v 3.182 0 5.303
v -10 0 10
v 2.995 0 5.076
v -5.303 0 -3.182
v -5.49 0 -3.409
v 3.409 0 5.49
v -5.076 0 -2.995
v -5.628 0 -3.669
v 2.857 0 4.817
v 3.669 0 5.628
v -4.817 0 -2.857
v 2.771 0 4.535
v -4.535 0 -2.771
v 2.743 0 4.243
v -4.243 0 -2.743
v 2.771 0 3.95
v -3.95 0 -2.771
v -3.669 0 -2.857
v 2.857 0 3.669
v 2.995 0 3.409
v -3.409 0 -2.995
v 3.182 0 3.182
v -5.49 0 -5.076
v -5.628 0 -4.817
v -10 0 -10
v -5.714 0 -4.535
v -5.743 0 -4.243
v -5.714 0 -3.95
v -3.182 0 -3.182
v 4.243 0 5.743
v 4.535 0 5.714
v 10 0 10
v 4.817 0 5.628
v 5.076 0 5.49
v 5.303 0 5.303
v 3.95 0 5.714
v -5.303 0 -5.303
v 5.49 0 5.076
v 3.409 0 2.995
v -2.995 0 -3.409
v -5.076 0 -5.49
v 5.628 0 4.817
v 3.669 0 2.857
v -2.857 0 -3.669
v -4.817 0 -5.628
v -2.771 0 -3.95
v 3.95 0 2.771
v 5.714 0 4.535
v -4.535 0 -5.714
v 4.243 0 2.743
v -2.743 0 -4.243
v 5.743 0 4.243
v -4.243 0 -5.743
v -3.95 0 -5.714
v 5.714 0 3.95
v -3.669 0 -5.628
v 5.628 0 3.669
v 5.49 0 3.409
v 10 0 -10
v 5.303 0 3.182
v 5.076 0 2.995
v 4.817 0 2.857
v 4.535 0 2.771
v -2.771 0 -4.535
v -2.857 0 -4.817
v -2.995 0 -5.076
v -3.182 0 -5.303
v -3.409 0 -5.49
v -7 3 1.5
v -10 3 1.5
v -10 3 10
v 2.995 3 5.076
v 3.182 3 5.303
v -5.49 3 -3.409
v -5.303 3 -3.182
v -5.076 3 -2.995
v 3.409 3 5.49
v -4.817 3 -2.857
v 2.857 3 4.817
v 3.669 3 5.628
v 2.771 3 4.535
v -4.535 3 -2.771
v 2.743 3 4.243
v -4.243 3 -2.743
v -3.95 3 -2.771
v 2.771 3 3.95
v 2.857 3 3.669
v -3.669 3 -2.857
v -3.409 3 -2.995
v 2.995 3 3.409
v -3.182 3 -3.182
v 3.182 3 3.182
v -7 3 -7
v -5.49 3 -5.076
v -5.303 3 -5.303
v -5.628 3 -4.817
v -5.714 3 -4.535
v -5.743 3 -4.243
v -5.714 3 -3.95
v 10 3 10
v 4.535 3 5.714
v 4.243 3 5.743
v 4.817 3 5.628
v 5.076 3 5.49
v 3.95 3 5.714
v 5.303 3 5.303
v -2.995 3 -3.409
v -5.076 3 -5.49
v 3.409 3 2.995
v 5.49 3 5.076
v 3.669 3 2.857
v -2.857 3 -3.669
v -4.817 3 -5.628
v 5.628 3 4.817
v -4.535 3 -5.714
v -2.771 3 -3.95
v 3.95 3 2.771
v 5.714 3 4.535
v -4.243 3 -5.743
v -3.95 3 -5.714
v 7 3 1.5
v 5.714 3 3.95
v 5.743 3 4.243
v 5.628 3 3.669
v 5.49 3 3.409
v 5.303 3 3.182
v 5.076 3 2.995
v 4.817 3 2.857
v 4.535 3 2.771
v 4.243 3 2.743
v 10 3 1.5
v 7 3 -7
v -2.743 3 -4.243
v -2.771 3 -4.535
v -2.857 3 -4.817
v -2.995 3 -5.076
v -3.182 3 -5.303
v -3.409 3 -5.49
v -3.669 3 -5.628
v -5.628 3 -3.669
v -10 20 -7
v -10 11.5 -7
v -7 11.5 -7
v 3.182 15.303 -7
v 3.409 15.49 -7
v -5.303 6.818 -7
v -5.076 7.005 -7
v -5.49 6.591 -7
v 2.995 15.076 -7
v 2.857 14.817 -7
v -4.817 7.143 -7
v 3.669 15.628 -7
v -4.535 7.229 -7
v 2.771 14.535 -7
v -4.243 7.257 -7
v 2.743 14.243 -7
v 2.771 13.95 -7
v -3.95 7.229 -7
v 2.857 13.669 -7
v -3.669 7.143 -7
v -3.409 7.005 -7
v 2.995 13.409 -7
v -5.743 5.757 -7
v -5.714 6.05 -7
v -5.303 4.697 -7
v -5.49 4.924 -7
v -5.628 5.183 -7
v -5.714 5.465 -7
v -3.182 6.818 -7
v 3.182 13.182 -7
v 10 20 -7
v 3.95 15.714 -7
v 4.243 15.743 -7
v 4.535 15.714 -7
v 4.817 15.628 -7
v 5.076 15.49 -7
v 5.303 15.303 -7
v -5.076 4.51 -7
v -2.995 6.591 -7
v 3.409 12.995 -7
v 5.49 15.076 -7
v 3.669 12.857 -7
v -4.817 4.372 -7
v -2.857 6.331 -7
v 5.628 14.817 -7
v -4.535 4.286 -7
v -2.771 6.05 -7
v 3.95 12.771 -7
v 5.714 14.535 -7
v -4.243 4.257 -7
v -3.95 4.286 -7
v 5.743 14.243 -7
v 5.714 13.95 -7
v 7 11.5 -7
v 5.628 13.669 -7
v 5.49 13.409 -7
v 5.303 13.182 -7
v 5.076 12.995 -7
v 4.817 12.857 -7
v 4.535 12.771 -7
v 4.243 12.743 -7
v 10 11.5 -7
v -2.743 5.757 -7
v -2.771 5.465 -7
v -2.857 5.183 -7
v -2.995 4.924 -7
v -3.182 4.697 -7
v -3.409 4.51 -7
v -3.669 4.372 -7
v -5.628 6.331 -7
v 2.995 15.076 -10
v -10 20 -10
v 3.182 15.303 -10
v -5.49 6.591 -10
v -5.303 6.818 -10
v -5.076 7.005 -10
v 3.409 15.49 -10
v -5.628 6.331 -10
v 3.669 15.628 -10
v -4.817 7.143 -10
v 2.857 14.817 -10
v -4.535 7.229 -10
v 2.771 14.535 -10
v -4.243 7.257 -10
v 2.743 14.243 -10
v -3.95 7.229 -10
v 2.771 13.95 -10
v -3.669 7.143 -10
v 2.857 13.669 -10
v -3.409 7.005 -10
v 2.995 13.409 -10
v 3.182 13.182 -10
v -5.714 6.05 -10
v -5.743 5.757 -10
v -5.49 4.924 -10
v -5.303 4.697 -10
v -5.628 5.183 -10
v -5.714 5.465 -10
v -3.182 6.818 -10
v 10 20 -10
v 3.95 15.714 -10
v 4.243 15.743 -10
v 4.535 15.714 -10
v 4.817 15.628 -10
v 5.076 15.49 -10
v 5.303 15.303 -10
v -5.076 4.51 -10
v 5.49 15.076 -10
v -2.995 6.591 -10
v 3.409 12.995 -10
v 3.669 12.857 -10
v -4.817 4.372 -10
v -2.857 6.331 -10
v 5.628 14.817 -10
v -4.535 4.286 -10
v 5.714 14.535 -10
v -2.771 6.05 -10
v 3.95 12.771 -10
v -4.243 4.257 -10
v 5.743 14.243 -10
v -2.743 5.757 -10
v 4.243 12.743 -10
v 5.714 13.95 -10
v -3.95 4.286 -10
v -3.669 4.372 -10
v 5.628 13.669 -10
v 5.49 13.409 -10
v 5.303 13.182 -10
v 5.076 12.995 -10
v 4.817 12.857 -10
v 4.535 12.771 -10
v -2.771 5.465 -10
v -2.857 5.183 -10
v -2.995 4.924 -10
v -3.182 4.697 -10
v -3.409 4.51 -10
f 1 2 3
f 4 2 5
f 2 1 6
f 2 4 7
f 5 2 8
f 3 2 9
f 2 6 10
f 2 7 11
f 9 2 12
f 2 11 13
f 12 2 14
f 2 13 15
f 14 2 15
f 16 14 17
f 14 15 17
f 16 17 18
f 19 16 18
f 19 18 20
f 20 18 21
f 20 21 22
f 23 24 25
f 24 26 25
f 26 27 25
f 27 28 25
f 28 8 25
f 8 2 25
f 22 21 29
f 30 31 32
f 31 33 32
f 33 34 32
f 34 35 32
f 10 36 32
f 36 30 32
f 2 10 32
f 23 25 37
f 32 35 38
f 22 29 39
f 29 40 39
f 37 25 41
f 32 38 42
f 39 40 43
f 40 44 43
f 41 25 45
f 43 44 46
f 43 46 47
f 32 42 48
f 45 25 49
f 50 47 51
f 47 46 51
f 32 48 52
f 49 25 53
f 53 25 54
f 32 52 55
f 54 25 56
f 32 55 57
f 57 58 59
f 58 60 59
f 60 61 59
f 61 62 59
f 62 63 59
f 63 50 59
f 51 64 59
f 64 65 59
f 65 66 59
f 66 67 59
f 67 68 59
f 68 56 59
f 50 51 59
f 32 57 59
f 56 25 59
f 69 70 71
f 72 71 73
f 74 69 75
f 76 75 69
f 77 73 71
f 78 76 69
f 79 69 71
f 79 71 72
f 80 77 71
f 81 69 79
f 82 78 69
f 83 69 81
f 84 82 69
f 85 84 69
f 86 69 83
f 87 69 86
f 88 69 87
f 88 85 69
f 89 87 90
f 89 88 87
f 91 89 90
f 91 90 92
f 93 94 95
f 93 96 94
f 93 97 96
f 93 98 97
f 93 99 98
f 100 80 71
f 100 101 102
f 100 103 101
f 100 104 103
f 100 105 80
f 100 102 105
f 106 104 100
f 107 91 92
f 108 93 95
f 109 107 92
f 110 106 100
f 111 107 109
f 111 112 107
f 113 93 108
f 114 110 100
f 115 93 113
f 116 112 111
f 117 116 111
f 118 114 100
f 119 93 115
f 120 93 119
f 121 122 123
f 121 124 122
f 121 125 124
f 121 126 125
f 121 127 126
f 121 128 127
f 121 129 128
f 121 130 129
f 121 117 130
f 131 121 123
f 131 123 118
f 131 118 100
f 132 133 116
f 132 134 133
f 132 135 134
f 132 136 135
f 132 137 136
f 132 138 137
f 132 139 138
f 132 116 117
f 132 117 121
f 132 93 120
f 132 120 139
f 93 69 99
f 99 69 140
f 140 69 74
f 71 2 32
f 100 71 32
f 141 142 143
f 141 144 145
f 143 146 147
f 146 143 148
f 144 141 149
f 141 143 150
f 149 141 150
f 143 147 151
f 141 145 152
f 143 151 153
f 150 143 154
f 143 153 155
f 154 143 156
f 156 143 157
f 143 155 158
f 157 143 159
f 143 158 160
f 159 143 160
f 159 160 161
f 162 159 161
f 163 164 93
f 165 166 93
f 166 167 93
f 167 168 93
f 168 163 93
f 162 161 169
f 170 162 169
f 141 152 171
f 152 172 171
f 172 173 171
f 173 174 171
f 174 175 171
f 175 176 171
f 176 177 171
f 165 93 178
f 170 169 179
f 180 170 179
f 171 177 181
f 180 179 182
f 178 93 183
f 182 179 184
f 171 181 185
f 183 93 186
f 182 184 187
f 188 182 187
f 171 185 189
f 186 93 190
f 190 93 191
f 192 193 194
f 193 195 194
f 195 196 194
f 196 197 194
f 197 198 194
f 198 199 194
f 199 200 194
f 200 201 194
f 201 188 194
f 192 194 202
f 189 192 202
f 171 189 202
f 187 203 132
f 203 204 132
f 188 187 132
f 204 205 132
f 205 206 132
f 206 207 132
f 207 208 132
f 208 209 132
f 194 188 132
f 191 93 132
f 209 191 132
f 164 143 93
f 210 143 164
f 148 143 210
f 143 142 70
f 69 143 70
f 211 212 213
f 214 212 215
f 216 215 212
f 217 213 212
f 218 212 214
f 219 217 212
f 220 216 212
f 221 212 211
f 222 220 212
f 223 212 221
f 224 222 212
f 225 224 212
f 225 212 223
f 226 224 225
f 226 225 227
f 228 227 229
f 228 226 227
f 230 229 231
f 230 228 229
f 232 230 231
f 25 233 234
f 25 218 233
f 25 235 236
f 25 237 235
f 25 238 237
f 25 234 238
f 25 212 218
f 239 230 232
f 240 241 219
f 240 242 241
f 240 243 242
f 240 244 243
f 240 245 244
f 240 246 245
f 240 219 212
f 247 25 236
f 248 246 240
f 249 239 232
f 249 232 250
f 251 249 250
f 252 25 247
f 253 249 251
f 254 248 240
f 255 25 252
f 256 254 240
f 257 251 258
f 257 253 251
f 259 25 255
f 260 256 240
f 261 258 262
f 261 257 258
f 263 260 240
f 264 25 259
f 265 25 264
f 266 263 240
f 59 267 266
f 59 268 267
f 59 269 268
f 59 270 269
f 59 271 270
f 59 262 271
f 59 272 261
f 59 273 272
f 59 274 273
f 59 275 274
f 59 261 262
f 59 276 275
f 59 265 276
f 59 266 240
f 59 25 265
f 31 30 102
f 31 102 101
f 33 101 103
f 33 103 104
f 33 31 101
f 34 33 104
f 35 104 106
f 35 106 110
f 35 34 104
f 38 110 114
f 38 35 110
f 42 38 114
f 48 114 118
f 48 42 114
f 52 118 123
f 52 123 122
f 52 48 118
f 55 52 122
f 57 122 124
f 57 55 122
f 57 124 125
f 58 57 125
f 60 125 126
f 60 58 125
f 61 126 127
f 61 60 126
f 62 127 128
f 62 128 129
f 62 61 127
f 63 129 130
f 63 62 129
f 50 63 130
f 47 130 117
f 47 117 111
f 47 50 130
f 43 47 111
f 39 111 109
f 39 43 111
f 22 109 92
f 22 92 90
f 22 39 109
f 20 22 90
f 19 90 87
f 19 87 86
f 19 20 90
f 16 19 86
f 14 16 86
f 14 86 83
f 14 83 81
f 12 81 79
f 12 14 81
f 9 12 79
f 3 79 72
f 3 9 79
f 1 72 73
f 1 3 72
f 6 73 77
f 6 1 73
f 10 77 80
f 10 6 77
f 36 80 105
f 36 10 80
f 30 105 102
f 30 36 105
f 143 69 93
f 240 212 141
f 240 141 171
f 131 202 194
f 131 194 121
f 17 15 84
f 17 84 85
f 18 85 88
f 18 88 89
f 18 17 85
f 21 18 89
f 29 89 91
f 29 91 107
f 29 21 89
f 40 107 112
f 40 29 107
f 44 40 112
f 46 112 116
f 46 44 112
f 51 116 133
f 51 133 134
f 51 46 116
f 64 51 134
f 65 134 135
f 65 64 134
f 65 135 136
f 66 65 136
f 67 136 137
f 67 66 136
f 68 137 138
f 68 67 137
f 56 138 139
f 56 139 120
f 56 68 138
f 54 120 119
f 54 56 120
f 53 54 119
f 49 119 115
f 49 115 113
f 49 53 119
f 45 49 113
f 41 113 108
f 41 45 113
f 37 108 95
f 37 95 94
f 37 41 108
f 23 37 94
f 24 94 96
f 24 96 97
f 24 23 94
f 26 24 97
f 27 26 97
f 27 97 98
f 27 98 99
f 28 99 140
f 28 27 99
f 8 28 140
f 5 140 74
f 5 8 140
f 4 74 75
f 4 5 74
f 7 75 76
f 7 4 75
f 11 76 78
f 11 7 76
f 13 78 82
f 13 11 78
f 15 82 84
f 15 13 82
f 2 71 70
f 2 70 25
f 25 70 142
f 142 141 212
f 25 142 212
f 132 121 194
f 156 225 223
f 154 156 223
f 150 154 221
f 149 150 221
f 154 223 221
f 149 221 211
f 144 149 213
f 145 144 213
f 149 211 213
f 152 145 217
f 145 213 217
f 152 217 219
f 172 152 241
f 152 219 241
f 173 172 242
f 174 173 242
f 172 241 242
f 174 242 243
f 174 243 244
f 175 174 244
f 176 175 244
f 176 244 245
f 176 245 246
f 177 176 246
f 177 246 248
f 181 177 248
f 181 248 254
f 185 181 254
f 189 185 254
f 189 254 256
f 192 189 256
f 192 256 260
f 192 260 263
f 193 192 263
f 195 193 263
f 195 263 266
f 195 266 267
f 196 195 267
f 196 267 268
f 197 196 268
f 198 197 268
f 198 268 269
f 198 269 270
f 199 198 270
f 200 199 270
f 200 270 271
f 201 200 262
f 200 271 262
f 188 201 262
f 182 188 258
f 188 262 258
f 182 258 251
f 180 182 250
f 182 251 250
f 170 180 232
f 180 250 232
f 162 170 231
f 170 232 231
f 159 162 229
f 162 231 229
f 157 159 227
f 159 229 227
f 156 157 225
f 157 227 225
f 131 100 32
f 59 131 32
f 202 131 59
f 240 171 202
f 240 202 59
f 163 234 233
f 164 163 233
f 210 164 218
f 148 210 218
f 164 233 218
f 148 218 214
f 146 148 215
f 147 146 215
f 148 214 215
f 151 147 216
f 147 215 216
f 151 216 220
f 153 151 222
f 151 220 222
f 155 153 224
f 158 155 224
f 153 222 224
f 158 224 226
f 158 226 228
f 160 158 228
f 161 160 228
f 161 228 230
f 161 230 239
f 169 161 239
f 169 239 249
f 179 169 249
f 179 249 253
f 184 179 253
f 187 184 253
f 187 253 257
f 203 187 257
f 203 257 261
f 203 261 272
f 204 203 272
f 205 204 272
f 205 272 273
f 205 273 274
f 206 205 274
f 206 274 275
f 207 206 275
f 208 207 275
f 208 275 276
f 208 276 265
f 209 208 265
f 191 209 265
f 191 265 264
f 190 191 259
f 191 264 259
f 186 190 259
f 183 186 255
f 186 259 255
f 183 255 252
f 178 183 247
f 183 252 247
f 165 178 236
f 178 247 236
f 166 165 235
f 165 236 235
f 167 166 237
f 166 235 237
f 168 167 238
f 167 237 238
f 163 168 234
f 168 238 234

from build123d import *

# Parameters (mm, degrees)
SKETCH1_W           = 20
SKETCH1_H           = 20
SKETCH1_R           = 1.5
BOSS_EXTRUDE1_DEPTH = 3
SKETCH2_W           = 20
SKETCH2_H           = 3
BOSS_EXTRUDE2_DEPTH = 17
SKETCH3_R           = 1.5
CUT_EXTRUDE1_DEPTH  = 30
BOSS_EXTRUDE3_DEPTH = 3
BOSS_EXTRUDE4_START = -20
BOSS_EXTRUDE4_DEPTH = 3


with BuildPart() as part:
    # Sketch1 → Boss-Extrude1 (new body)
    with BuildSketch(Plane(origin=(0, 0, 0), x_dir=(1, 0, 0), z_dir=(0, 1, 0))):
        Rectangle(SKETCH1_W, SKETCH1_H)
        with Locations(Location((-4.242640687, 4.242640687, 0), (0, 0, 270))):
            Circle(SKETCH1_R, mode=Mode.SUBTRACT)
        with Locations(Location((4.242640687, -4.242640687, 0), (0, 0, 270))):
            Circle(SKETCH1_R, mode=Mode.SUBTRACT)
    extrude(amount=BOSS_EXTRUDE1_DEPTH)

    # Sketch2 → Boss-Extrude2 (add)
    with BuildSketch(Plane(origin=(0, 3, 0), x_dir=(1, 0, 0), z_dir=(0, 1, 0))):
        with Locations((0, 8.5)):
            Rectangle(SKETCH2_W, SKETCH2_H)
    extrude(amount=BOSS_EXTRUDE2_DEPTH)

    # Sketch3 → Cut-Extrude1 (cut)
    with BuildSketch(Plane(origin=(0, 0, -10), x_dir=(-1, 0, 0), z_dir=(0, 0, -1))):
        with Locations((-4.242640687, 14.242640687)):
            Circle(SKETCH3_R)
        with Locations((4.242640687, 5.757359313)):
            Circle(SKETCH3_R)
    extrude(amount=-CUT_EXTRUDE1_DEPTH, mode=Mode.SUBTRACT)

    # Sketch4 → Boss-Extrude3 (add)
    with BuildSketch(Plane.ZY.offset(10)):
        Polygon((-7, 11.5), (1.5, 3), (-7, 3), align=None)
    extrude(amount=-BOSS_EXTRUDE3_DEPTH)

    # Sketch4<2> → Boss-Extrude4 (add)
    with BuildSketch(Plane.ZY.offset(10).offset(BOSS_EXTRUDE4_START)):
        Polygon((-7, 11.5), (1.5, 3), (-7, 3), align=None)
    extrude(amount=BOSS_EXTRUDE4_DEPTH)


solid = part.part
